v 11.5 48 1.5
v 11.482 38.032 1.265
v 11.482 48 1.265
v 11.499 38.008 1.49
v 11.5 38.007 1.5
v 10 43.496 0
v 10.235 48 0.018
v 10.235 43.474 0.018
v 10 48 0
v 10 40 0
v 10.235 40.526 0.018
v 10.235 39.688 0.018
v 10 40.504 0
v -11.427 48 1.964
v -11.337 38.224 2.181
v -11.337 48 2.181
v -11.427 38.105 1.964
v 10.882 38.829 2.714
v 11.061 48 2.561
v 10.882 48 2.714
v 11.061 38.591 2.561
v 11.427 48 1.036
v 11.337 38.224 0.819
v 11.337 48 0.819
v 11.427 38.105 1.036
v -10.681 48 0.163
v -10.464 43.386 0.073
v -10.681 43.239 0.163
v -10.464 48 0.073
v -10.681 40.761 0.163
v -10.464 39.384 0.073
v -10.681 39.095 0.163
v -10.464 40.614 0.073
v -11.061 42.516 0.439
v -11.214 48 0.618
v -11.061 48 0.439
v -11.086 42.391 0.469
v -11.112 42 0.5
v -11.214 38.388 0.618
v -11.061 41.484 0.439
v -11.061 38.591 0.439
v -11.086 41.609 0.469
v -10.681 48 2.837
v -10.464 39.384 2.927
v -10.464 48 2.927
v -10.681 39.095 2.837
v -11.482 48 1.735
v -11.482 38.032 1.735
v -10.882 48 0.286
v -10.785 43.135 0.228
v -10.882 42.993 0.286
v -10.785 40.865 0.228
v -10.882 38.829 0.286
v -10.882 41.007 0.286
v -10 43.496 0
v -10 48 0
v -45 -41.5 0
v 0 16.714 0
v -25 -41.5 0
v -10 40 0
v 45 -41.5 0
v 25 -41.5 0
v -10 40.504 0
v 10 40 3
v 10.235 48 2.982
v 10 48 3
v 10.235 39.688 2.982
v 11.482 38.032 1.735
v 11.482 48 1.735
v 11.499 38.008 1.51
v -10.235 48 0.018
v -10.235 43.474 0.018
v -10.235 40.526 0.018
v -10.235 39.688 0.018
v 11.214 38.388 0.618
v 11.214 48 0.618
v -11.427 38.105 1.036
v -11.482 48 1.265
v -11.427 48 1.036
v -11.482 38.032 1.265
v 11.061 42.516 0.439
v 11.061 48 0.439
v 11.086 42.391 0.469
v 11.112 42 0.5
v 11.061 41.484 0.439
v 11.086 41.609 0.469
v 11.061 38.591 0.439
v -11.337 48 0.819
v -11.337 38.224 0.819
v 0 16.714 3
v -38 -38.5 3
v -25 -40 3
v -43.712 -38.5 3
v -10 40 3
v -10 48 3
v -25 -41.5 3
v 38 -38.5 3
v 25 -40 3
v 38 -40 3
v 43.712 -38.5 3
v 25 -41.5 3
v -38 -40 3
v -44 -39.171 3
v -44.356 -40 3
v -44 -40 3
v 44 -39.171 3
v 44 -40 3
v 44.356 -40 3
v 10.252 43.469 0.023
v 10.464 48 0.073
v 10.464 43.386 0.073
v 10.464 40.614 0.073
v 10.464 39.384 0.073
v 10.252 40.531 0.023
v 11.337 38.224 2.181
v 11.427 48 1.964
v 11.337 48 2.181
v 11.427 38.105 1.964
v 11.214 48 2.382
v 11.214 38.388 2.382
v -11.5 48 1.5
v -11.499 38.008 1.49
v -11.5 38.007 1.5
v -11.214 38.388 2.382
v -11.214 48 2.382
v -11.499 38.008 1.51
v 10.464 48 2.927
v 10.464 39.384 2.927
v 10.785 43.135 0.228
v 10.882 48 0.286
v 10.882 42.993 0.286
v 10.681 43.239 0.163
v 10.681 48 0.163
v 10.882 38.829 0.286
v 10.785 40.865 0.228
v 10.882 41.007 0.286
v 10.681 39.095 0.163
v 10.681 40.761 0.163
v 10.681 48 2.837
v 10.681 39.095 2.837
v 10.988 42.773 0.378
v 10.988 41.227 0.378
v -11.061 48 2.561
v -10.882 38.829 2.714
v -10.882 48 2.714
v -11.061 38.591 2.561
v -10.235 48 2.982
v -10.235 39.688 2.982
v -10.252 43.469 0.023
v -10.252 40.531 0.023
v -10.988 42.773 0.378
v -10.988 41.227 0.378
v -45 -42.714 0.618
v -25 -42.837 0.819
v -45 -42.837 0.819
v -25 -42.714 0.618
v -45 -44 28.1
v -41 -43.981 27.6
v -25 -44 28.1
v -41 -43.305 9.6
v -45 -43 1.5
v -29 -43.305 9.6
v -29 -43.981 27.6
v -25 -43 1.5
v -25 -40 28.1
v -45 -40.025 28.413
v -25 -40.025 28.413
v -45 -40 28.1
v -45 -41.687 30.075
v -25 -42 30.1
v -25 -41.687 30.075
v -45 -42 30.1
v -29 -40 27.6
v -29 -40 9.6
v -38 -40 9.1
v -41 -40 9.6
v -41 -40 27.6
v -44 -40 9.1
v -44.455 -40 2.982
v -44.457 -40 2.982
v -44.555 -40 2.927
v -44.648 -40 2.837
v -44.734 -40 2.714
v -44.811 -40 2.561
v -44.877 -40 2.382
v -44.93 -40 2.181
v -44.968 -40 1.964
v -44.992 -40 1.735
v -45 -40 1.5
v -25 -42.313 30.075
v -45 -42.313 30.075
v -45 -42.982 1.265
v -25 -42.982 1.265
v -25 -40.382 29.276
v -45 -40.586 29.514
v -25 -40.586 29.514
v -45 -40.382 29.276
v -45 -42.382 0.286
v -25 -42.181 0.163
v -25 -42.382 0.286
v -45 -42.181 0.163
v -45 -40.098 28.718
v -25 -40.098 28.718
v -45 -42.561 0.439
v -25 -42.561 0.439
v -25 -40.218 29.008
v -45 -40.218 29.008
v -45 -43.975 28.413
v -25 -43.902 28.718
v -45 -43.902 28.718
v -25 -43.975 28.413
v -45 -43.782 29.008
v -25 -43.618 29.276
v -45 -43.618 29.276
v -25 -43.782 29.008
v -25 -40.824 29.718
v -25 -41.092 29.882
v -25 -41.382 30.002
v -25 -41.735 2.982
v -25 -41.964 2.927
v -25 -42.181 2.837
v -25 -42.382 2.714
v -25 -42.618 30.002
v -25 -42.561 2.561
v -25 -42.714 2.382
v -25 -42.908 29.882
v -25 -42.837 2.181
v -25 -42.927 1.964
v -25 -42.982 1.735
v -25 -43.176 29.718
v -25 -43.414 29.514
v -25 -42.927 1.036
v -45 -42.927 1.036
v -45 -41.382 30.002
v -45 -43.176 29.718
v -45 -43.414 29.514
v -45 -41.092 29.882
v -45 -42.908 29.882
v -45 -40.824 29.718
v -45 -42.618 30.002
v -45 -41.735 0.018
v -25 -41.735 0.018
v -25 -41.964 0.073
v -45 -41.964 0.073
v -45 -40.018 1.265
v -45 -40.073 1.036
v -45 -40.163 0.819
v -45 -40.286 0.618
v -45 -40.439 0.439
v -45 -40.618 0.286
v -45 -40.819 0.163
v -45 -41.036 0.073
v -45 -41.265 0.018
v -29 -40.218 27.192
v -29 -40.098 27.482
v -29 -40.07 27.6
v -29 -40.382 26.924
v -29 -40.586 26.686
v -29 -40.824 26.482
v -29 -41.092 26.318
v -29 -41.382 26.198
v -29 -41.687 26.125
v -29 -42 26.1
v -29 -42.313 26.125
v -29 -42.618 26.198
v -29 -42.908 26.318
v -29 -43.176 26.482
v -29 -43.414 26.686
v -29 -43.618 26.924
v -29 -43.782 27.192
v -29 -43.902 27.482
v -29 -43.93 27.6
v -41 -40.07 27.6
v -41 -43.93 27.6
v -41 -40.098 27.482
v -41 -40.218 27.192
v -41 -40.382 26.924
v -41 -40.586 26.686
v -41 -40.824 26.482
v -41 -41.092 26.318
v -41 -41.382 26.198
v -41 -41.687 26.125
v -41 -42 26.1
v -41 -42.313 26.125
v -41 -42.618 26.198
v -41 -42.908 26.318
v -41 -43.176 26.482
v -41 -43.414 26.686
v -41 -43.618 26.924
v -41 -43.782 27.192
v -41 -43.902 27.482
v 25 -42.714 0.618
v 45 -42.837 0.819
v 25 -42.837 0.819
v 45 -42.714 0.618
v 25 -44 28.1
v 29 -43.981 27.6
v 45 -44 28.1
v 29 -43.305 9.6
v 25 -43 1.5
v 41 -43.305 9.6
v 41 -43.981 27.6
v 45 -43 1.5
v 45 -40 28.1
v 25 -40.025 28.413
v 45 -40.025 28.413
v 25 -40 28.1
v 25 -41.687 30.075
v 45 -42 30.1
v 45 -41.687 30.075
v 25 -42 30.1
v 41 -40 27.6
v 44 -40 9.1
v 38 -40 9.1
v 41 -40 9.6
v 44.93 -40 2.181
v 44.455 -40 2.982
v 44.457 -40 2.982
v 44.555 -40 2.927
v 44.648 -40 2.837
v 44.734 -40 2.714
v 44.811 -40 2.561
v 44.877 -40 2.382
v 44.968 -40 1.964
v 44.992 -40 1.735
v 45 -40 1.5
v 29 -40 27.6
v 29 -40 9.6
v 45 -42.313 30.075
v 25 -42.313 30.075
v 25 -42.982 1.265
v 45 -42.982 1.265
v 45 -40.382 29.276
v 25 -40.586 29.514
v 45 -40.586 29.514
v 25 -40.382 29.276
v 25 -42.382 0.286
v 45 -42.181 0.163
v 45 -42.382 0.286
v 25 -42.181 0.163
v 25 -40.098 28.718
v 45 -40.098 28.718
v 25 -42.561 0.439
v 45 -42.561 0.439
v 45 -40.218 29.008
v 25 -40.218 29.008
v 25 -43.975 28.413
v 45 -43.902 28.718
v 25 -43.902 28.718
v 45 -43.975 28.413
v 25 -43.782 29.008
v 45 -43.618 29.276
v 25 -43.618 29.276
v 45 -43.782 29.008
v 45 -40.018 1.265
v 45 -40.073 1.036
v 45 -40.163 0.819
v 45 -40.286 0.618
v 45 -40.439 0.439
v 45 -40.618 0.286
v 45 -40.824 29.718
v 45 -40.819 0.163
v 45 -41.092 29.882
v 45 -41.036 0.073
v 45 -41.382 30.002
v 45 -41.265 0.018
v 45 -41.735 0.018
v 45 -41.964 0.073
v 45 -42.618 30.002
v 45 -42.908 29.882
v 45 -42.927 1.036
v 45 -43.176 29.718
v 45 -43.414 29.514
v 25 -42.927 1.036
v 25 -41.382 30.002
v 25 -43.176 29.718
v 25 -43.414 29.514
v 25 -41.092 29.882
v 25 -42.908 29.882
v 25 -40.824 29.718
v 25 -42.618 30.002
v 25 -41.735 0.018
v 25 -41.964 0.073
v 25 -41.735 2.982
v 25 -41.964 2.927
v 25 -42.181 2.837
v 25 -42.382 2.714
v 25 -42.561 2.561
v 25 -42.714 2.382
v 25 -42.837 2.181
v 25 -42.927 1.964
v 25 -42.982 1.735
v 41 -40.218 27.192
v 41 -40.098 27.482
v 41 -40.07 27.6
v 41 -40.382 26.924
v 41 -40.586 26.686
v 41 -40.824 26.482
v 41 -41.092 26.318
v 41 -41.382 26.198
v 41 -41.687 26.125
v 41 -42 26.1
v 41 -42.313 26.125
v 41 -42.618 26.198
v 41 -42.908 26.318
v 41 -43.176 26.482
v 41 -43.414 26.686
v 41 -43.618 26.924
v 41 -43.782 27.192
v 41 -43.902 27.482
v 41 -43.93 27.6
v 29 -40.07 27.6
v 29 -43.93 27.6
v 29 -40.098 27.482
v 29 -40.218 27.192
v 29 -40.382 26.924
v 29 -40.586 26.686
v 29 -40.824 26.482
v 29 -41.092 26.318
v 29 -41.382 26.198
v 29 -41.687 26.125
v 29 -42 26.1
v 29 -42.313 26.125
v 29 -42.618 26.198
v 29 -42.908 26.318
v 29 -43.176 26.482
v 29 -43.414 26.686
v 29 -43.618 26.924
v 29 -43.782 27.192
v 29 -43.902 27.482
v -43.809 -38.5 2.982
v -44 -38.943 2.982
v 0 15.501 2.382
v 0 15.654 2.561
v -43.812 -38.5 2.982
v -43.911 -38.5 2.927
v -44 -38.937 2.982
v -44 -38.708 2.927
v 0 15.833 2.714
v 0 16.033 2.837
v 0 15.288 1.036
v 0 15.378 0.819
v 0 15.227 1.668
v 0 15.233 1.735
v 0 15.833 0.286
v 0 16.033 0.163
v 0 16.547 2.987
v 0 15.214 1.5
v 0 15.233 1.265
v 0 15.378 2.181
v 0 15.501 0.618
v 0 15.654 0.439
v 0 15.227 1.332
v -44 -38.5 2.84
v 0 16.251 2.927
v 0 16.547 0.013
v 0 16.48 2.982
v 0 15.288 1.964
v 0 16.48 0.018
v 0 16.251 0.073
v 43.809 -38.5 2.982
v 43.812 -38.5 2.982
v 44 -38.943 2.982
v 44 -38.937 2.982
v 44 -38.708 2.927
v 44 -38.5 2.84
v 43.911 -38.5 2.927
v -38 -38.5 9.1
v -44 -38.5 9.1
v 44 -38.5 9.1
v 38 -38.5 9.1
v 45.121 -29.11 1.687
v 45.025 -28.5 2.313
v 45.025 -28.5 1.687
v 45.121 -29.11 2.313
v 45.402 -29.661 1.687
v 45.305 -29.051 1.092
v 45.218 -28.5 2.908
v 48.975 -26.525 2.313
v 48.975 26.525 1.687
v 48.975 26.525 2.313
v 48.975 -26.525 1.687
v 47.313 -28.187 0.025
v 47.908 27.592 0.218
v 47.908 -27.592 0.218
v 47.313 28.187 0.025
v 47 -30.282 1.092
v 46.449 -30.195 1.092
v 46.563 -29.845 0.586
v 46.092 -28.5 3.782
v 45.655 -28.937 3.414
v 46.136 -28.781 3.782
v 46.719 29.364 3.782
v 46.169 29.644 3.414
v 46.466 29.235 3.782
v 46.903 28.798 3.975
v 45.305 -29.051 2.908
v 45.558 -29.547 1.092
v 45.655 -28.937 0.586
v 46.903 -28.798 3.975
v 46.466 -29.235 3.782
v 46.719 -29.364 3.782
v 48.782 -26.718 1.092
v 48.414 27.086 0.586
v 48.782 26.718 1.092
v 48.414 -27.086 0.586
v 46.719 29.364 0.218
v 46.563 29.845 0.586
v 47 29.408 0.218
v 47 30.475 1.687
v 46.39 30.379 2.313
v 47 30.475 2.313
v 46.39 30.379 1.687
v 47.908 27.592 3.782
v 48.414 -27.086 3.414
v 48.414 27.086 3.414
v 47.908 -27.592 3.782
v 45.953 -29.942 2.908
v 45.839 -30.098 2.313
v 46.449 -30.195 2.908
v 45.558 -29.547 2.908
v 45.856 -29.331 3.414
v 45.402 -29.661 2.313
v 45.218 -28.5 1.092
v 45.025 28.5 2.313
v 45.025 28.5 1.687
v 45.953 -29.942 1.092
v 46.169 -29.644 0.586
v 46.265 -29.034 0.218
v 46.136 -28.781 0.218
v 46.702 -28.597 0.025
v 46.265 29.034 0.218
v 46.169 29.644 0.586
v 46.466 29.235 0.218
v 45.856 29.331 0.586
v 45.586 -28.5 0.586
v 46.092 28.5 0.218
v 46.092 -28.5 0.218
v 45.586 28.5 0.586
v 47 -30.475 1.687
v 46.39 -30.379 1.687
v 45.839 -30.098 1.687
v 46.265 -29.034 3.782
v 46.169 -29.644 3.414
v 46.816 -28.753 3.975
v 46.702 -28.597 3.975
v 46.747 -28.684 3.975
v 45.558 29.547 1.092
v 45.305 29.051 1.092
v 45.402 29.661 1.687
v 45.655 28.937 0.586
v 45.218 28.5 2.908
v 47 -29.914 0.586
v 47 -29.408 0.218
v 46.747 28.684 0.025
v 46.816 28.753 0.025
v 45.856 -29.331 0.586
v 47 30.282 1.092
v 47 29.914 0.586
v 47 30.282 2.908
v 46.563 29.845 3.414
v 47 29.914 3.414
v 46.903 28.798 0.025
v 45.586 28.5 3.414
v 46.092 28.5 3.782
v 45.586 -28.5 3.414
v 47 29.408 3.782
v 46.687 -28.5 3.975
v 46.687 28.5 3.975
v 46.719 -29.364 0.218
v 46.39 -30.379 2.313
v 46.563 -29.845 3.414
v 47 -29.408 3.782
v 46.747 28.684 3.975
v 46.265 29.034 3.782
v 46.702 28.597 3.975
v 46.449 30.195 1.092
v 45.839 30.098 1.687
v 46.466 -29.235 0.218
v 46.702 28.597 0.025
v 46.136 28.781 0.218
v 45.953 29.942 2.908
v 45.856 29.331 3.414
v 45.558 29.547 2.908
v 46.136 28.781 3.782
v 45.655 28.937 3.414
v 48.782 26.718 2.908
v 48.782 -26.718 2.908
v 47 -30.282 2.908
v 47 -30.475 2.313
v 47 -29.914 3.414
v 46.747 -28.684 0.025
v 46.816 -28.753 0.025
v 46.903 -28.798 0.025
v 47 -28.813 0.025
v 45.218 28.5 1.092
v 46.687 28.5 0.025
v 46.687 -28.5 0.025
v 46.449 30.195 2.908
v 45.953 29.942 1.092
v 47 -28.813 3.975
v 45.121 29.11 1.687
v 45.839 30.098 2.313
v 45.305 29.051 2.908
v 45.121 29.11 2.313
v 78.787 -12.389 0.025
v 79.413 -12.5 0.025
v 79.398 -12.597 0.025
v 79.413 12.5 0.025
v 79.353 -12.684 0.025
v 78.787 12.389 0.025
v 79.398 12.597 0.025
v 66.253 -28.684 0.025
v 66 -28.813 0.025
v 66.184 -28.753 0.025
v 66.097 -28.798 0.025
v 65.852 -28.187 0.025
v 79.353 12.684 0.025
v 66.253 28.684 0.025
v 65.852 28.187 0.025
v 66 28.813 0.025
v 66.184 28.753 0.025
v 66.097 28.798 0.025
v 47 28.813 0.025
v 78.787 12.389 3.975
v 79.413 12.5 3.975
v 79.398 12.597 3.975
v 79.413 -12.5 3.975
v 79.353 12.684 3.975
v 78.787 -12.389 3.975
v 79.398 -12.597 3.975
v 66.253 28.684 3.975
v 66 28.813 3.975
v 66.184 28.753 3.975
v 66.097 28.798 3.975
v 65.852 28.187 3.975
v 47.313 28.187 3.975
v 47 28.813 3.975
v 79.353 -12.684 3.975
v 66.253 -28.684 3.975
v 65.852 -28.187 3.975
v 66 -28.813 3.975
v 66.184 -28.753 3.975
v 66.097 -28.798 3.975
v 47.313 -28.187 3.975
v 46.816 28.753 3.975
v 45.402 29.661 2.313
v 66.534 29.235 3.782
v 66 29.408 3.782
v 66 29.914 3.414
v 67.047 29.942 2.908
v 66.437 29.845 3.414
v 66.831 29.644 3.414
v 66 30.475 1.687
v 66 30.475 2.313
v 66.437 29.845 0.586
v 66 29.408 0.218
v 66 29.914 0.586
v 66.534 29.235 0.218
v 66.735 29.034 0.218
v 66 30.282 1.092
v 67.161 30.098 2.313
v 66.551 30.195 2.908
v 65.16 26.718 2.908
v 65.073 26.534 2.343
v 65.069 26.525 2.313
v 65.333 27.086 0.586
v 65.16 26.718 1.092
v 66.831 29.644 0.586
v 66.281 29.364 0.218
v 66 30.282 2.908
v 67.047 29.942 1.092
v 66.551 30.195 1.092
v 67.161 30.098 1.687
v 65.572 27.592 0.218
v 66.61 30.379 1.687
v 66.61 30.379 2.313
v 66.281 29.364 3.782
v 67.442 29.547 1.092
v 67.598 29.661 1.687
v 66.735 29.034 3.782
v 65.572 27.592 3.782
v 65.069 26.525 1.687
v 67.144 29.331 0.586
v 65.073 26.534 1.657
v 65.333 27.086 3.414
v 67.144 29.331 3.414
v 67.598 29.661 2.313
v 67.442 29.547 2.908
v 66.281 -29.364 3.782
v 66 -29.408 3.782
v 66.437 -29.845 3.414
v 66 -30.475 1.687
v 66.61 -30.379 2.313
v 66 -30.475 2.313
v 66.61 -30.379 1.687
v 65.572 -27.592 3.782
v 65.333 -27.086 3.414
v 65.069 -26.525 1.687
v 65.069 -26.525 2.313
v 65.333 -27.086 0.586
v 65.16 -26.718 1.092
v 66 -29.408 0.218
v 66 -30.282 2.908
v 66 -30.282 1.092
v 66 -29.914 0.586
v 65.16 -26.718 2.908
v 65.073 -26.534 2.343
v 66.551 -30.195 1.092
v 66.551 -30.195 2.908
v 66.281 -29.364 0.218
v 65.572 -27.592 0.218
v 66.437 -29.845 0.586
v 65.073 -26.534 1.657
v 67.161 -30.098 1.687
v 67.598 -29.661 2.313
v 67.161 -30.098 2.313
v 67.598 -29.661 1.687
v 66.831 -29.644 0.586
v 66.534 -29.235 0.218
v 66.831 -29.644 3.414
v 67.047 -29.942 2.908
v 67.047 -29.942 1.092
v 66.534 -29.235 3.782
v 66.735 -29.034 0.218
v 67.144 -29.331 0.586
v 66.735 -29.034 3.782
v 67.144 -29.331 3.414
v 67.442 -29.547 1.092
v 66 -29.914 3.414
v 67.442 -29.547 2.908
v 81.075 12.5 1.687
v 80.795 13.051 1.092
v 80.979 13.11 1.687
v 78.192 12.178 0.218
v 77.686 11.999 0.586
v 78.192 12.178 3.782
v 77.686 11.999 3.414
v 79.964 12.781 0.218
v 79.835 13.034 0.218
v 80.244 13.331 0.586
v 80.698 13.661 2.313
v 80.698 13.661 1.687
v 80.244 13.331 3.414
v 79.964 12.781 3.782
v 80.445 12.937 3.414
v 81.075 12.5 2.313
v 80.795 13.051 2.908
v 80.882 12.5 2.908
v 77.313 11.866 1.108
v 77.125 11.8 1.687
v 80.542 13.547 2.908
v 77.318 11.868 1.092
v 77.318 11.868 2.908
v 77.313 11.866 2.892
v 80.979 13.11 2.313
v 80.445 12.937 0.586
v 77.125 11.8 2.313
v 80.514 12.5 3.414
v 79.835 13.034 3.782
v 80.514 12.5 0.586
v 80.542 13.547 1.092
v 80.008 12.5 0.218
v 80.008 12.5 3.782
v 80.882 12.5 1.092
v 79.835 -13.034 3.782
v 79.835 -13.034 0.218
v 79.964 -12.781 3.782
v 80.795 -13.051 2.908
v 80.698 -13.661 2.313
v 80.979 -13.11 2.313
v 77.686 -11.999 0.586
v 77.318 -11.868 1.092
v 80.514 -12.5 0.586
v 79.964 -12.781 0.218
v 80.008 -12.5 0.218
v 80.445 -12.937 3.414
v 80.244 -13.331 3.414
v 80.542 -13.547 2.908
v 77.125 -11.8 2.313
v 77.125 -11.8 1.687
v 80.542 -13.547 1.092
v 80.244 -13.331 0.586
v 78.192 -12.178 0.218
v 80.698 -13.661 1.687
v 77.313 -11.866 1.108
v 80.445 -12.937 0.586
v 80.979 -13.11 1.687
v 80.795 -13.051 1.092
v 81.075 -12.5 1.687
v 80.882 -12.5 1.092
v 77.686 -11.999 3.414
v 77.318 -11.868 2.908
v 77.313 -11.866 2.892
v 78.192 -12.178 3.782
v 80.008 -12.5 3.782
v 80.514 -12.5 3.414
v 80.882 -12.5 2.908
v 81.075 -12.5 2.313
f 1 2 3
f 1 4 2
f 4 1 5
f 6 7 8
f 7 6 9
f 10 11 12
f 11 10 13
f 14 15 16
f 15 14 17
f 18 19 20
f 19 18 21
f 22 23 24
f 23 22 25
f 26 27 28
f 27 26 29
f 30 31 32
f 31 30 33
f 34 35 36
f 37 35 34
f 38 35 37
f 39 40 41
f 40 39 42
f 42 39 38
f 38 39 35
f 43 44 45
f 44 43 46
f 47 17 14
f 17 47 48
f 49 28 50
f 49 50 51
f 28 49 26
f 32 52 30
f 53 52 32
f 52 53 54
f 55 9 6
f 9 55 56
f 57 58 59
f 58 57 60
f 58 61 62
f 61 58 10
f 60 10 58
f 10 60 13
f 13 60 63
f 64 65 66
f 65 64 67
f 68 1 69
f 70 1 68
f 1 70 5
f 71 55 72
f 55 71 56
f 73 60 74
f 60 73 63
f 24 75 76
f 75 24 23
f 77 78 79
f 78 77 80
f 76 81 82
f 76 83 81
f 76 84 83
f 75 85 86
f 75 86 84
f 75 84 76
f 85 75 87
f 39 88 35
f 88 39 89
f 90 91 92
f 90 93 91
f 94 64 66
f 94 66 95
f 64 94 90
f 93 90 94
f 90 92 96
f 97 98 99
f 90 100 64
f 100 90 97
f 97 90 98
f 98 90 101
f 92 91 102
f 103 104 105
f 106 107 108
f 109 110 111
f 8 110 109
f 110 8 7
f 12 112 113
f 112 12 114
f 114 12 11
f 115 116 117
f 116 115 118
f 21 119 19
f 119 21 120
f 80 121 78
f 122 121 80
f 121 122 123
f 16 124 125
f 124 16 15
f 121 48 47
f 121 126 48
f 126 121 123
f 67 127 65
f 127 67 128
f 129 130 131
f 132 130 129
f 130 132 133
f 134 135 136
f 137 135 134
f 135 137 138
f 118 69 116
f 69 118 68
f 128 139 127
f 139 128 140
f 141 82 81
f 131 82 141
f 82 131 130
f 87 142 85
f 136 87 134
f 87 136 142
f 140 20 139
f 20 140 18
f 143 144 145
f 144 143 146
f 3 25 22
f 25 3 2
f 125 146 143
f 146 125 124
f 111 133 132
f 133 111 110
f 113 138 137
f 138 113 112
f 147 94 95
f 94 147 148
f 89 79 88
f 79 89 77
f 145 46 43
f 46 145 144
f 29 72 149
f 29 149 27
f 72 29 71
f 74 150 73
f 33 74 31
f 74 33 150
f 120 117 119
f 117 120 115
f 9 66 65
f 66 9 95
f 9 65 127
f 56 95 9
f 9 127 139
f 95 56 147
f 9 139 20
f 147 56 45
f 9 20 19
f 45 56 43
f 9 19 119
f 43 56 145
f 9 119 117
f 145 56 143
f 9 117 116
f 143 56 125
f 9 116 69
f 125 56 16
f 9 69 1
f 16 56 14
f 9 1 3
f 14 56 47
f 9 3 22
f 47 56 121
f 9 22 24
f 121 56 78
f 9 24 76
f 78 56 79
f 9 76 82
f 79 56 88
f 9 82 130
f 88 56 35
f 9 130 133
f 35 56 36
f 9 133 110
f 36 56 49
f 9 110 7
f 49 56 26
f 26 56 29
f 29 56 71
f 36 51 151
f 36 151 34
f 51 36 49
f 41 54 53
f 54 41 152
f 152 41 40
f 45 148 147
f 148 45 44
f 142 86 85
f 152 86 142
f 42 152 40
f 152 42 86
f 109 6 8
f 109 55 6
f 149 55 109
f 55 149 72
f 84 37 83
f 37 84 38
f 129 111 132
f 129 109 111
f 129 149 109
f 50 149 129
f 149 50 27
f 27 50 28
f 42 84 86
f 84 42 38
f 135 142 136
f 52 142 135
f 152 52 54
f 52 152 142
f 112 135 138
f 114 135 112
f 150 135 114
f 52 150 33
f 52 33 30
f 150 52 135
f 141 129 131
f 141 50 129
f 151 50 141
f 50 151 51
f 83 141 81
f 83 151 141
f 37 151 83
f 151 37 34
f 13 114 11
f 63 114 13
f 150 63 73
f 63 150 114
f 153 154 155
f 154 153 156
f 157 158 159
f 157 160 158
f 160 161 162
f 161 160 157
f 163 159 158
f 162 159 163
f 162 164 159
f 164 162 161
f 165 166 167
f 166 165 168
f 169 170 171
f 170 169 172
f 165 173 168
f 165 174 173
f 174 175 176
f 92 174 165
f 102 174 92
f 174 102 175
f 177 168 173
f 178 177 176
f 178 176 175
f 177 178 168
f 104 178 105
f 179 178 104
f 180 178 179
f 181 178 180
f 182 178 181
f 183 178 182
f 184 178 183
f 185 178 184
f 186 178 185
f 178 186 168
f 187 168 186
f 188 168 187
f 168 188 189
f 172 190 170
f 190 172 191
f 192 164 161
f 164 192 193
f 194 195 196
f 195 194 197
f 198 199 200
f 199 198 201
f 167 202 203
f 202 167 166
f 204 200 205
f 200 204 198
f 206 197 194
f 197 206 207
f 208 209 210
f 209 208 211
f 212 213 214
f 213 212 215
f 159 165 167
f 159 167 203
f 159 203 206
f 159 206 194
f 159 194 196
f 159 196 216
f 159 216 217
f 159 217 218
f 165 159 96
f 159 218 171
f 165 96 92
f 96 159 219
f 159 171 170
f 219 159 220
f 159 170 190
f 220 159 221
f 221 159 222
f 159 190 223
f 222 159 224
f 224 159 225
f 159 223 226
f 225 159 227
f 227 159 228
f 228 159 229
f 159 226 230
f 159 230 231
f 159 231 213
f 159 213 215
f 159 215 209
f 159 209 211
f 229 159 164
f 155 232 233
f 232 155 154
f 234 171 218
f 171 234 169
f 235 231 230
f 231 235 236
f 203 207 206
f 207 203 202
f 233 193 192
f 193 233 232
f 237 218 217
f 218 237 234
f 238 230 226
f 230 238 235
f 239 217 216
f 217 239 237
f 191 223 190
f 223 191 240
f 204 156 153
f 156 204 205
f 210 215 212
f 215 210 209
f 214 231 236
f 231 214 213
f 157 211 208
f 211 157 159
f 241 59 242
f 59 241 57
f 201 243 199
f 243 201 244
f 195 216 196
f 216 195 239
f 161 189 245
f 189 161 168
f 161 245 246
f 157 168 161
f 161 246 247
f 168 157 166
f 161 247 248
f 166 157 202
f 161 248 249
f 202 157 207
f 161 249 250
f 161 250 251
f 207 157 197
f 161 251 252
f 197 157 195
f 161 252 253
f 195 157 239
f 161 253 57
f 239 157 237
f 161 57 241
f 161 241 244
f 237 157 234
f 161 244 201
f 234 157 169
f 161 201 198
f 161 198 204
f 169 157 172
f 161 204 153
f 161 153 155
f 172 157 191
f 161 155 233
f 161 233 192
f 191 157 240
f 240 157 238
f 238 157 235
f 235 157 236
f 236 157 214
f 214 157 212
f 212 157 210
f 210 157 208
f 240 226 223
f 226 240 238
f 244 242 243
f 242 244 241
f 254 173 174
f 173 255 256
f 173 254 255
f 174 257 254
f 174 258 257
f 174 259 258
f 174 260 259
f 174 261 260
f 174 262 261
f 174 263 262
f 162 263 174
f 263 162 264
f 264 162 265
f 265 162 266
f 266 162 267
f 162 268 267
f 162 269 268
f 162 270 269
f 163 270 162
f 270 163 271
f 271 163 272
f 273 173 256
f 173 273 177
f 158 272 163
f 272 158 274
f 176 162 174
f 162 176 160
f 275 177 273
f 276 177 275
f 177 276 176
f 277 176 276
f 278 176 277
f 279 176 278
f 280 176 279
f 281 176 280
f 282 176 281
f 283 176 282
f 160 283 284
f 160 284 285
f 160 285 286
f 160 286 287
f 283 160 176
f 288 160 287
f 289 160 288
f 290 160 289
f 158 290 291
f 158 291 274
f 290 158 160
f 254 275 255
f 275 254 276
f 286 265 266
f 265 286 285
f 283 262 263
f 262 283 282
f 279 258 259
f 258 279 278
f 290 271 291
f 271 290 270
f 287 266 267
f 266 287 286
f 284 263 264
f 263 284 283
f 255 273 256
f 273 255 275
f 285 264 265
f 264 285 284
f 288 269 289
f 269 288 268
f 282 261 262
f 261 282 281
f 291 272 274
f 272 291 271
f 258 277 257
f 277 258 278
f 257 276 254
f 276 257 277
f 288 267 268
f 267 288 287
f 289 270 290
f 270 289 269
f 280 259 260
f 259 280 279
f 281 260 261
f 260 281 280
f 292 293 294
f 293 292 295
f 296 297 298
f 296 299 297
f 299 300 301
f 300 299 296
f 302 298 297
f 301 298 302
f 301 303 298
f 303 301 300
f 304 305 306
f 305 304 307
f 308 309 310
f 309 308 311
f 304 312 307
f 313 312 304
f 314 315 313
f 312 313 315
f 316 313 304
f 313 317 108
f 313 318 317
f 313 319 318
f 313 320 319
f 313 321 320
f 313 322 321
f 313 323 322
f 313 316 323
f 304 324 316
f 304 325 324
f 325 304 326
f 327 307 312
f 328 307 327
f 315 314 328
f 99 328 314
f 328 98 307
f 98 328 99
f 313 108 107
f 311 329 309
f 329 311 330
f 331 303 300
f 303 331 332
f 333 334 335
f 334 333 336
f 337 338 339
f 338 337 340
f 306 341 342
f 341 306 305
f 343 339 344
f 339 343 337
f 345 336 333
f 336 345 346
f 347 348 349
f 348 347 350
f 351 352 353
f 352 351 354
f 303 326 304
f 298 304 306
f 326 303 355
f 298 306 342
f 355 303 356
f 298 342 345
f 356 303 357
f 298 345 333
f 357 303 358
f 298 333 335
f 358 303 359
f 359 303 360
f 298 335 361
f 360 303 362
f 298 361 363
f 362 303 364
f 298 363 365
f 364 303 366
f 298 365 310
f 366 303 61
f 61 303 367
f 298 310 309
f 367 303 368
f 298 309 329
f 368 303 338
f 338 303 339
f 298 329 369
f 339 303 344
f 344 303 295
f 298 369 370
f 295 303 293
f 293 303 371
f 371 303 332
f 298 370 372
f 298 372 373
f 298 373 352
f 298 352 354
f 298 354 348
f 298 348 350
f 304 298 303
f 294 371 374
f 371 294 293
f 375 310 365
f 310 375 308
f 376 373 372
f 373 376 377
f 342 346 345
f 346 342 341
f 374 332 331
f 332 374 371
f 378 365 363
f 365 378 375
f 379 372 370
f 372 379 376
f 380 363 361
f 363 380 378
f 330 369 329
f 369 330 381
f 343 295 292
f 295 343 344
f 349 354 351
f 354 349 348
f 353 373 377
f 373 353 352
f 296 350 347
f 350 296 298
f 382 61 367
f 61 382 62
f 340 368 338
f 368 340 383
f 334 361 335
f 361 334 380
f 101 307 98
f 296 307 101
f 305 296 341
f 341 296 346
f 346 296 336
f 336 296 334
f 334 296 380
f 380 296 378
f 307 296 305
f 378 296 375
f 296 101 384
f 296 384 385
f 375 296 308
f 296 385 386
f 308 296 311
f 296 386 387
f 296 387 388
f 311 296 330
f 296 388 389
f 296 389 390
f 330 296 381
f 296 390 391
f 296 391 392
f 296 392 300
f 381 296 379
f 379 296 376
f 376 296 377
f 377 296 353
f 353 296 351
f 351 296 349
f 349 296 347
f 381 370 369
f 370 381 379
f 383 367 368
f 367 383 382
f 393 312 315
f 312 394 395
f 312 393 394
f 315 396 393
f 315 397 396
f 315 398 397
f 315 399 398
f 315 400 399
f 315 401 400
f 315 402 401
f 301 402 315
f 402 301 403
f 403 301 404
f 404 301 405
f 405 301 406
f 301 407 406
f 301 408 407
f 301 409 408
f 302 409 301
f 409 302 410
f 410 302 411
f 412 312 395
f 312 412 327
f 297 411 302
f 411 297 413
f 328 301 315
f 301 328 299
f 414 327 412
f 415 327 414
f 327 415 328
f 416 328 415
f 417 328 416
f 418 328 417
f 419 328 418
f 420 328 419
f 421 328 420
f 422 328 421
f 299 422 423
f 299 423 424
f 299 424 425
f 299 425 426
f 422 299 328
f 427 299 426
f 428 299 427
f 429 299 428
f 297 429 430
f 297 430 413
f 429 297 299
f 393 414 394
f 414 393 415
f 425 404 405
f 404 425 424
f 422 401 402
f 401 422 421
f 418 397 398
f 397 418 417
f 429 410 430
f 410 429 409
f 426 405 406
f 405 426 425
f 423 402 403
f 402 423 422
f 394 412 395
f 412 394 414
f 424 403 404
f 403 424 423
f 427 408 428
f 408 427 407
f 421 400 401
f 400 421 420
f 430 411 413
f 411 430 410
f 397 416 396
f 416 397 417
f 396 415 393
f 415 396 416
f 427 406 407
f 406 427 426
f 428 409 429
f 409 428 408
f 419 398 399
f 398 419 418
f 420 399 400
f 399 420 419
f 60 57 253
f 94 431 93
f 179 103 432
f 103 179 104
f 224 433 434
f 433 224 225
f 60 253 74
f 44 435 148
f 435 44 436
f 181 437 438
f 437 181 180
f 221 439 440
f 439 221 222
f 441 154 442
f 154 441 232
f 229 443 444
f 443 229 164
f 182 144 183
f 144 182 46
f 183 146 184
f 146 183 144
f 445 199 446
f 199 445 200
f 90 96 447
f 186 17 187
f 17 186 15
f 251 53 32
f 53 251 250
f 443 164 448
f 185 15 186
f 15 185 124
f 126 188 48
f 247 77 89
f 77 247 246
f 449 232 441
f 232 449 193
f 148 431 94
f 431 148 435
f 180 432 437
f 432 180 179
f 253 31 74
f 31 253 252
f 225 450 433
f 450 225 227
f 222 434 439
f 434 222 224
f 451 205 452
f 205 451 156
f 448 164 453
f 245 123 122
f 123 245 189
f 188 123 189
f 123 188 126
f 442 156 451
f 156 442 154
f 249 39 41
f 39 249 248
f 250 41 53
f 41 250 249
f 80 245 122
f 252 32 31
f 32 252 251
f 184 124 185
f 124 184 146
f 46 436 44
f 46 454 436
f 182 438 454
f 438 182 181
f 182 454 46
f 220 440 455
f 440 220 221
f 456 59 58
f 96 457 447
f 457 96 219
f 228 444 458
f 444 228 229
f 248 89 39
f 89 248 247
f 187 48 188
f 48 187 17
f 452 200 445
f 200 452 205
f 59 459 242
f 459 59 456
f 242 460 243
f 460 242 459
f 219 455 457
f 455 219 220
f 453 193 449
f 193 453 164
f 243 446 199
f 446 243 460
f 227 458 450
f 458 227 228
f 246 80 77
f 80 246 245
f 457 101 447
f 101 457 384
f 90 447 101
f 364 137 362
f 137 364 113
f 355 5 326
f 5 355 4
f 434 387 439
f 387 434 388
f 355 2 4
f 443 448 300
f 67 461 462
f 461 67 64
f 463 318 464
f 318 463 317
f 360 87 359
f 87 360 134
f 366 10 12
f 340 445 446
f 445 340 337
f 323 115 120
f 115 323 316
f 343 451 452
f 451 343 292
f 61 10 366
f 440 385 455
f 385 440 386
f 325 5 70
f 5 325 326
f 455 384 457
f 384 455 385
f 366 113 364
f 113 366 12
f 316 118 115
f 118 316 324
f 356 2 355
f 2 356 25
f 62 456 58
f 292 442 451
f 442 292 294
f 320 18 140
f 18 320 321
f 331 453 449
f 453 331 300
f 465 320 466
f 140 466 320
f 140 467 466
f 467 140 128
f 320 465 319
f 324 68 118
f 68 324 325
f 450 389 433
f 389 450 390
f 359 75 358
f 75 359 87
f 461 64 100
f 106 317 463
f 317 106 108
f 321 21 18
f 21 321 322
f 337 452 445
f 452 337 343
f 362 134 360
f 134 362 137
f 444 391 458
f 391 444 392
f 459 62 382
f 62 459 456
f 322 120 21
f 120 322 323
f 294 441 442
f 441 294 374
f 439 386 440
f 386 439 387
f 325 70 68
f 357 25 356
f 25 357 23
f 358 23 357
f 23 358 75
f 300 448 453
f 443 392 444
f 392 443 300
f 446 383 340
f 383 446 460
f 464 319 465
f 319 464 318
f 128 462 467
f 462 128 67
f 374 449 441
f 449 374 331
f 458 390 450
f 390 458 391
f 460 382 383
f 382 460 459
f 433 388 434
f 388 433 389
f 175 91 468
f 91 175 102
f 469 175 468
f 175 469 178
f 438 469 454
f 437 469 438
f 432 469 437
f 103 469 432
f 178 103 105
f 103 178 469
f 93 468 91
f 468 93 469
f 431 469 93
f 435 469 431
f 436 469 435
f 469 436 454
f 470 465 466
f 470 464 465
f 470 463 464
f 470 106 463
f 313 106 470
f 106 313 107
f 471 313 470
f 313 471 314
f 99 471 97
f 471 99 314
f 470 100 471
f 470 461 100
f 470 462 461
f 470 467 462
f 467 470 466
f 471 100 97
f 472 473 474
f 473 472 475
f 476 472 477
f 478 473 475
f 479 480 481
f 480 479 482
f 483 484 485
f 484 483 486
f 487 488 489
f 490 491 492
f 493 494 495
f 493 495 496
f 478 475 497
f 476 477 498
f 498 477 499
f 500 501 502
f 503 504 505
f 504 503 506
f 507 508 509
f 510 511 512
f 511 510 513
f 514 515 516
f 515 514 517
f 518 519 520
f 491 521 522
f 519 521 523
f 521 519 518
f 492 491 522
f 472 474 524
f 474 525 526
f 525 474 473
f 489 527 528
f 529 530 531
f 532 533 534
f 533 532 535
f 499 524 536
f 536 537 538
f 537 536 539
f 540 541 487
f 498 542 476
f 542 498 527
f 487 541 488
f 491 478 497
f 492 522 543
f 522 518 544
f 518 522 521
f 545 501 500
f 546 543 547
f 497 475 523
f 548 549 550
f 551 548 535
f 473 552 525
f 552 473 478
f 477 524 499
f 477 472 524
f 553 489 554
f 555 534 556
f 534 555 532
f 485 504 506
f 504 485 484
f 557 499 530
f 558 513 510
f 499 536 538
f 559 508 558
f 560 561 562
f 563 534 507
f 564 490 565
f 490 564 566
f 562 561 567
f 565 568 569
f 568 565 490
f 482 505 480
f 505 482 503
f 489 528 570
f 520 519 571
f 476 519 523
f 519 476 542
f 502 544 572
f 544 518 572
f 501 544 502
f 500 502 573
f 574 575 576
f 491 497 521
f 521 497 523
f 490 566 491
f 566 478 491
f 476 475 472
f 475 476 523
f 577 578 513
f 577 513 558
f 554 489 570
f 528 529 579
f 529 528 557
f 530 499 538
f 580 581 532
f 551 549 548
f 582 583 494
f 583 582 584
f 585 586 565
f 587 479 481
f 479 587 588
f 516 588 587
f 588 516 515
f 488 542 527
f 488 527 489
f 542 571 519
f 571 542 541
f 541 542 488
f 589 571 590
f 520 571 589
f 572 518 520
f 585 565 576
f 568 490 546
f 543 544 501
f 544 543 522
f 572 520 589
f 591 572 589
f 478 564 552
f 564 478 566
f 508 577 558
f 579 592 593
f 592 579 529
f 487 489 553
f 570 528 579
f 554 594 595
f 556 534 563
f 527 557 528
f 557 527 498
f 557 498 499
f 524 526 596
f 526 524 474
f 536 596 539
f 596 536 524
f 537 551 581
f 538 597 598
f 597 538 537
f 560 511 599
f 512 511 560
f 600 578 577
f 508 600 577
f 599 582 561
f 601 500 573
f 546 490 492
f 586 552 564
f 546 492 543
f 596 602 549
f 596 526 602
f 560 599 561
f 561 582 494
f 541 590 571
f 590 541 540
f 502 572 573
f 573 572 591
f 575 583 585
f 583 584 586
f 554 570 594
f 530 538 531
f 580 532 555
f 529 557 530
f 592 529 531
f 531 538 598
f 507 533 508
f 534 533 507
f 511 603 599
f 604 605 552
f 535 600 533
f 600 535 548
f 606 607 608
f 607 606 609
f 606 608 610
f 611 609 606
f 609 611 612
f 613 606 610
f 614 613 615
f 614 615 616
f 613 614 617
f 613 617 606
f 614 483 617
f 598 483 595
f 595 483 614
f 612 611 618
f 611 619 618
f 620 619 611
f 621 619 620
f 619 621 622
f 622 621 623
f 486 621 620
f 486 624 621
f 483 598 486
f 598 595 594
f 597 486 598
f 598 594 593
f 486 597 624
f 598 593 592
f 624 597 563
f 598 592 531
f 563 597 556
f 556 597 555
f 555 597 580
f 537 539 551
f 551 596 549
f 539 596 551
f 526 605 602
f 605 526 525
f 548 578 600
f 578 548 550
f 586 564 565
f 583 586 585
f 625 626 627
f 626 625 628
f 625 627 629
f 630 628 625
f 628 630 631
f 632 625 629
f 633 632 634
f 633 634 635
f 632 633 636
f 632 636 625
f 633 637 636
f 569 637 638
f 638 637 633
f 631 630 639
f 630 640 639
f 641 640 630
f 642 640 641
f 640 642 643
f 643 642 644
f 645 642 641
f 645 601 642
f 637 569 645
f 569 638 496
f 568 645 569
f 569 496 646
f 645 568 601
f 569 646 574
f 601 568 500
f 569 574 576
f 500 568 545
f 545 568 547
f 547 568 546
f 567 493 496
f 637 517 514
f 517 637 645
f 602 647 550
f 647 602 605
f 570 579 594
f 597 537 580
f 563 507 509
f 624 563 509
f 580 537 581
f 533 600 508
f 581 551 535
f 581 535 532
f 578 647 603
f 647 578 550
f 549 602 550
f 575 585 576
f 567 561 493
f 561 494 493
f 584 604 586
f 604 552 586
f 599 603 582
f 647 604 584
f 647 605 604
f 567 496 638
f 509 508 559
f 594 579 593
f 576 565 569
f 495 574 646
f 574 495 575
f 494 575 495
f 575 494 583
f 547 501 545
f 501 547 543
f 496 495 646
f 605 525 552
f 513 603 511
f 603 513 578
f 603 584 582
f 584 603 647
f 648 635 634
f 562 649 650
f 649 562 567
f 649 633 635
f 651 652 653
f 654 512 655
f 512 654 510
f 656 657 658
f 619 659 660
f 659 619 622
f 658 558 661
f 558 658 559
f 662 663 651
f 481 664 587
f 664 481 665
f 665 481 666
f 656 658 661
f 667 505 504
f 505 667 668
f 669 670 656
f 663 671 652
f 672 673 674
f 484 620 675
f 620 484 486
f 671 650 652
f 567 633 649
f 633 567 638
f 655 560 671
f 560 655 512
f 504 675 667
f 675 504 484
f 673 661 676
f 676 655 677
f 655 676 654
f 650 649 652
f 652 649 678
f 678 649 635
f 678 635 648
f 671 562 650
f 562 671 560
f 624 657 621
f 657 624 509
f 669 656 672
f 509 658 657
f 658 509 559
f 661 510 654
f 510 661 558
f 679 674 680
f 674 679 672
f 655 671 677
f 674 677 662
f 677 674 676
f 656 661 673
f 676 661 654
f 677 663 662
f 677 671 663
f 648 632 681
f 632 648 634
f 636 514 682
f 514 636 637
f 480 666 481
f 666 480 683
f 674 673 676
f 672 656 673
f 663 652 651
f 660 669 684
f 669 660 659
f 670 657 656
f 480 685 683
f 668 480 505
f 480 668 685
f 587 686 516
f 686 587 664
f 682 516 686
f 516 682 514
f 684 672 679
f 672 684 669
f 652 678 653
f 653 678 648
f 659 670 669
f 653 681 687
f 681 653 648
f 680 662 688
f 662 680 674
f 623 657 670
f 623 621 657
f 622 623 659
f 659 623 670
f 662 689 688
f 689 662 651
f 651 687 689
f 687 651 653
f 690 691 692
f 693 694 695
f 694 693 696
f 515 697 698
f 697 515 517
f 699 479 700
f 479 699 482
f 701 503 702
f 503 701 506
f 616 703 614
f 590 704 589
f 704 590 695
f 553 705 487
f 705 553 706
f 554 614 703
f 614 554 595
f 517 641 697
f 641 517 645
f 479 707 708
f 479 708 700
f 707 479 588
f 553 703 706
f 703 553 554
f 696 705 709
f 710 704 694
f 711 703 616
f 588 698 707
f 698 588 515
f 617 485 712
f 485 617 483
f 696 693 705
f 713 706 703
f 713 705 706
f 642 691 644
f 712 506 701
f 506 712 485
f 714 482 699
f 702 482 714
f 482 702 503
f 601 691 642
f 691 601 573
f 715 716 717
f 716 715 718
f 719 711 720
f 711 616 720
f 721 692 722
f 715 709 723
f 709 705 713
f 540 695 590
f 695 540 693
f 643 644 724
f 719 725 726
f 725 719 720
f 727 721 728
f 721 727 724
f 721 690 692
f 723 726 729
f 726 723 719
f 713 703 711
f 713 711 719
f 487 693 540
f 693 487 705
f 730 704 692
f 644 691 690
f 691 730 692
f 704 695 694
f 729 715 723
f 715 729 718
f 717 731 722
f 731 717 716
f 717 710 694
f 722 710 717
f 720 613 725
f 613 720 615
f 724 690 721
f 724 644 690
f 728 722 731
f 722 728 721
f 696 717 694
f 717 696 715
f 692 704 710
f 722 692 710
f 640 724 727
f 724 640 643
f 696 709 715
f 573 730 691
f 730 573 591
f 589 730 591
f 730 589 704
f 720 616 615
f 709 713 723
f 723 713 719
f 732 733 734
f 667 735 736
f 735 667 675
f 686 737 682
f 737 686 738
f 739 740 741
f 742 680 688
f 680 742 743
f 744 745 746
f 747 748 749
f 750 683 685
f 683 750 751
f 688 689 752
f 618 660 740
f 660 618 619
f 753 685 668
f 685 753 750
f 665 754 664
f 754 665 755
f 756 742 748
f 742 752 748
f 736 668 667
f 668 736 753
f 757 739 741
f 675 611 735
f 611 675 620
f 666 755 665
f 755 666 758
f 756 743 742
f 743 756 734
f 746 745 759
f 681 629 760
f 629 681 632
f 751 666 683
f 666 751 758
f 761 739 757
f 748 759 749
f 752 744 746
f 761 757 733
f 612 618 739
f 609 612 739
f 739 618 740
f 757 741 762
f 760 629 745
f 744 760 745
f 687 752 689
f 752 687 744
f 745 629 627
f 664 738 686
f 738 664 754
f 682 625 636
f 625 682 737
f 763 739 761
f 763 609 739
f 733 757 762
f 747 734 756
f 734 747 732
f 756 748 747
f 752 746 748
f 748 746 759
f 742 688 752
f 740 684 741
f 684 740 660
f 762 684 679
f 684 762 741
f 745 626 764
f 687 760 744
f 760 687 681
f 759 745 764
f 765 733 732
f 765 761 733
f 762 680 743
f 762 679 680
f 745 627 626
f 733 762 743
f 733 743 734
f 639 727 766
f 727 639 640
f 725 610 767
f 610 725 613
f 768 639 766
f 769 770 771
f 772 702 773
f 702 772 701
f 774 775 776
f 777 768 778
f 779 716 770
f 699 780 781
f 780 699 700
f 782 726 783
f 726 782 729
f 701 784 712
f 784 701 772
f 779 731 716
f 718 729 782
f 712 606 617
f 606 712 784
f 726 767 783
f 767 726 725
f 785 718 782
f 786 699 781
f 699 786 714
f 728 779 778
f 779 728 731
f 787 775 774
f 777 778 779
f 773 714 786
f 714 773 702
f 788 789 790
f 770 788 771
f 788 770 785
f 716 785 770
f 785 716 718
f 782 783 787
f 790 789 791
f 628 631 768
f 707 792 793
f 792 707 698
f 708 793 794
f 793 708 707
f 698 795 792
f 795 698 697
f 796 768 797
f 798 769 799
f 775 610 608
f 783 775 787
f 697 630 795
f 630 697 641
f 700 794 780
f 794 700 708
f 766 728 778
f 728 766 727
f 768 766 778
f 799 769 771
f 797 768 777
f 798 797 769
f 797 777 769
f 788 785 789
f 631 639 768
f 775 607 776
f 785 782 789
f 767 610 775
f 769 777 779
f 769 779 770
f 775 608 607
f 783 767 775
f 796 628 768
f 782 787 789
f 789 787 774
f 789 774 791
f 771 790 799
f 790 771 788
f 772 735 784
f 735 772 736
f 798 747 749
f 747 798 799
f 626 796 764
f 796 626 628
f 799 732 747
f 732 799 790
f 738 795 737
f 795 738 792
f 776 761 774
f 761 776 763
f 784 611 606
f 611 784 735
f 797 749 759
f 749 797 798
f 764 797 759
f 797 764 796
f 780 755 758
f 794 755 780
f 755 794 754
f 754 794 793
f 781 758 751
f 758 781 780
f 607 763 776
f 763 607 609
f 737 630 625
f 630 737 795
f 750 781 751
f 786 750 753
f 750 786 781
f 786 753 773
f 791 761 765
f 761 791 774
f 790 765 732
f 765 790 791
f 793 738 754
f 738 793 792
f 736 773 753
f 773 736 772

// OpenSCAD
// A front panel to hinge and mount a OnePlus One phone into the Note4 VR Headset

// Which part to make?
part = "both"; // [first:Panel Only,second:Clip Only,both:Panel and Clip]

// Measured Width of Phone
phoneHeight = 77; // measured width of OnePlus One (sideways)

// Measured Depth of Phone (7.1 for iPhone6+, 9.1 for Oneplus One)
phoneDepth = 7.1; // measured depth of phone

/* [Hidden] */
$fn=40;
panelHeight = 80; // really measured it as 79
panelThickness = 3; // thickness of plastic for the panel
hingeThickness = 4; // thickness of lower hooks
hookSeparation = 70; // distance between the two lower hooks
hookWidth = 12; // width of the bottom hooks. Measured as 10.
hookDepth = 18; // distance from flat face to inner hook
foamFudge = 1; // fudge factor due to adding foam, clip radius being oversized, etc
tabWidth = 20; // width of upper tab
tabHeight = 8; // height to make the upper tab
clipThickness = 4; // how thick to make the clip
clipRadius = clipThickness * .5; // Same as clipThickness to make it round  clipThickness * .6; // radius for clips. They'll be slightly bigger than clipThickness
clipClearance = 55; // inner width for upper clip
clipDepthClearance = 17; // inner depth for upper clip
clipWidth = clipClearance + clipRadius; // adjusted for dimensioning
clipDepth = clipDepthClearance + clipRadius; // inner depth before taper for upper clip



if (part== "first") panel();
else if (part == "second") clip();
else if (part == "both") makeBoth();
else makeBoth();


module makeBoth()
{
	panel();
	
	translate ([(hookSeparation + hookWidth)/2 + hingeThickness + clipRadius, 0, 0]) 
	rotate([0,0,270])
	clip();
}

module panel()
{
	// create the panel itself
	union()
	{
		// first leg
		hull()
		{
			translate ([0,(panelHeight/2), panelThickness/2])
			rotate([0,90,0])
			cylinder(r=panelThickness/2, h=tabWidth, center=true);
			
			translate ([-hookSeparation/2, -(panelHeight/2 + panelThickness/2), panelThickness/2])
			rotate([0,90,0])
			cylinder(r=panelThickness/2, h=hookWidth + 2*hingeThickness, center=true);
		}
		
		// second leg
		hull()
		{
			translate ([0,(panelHeight/2), panelThickness/2])
			rotate([0,90,0])
			cylinder(r=panelThickness/2, h=tabWidth, center=true);
				
			translate ([hookSeparation/2, -(panelHeight/2 + panelThickness/2), panelThickness/2])
			rotate([0,90,0])
			cylinder(r=panelThickness/2, h=hookWidth + 2*hingeThickness, center=true);
		}
			
		// add tab
		difference()
		{
			hull()
			{
				translate ([-tabWidth/2, panelHeight/2 + tabHeight/2 - 1, panelThickness/2])
				rotate ([90,0,0])
				cylinder (r=panelThickness/2, h=tabHeight + 2, center=true);
		
				translate ([tabWidth/2, panelHeight/2 + tabHeight/2 - 1, panelThickness/2])
				rotate ([90,0,0])
				cylinder (r=panelThickness/2, h=tabHeight + 2, center=true);
			}
				
			// remove a notch for better clip grip
			translate ([0,(panelHeight + hingeThickness)/2, -clipRadius])
			rotate ([0,90,0])
			cylinder (r=clipRadius+.5,h=tabWidth * 2,center=true);
		}
			
		// add hooks
		translate ([-hookSeparation/2, -panelHeight/2, 0])
		hook();
		
		translate ([hookSeparation/2, -panelHeight/2, 0])
		hook();
			
		// add nubbins for onePlus self alignment (uncomment and adjust "phoneHeight" to make a mini platform to auto-align your phone)
		translate ([-(hookSeparation/2+hookWidth/2), -(panelHeight - (panelHeight - phoneHeight)/2) / 2, (panelThickness + phoneDepth + foamFudge) / 2])
		cube ([hookWidth/2, (panelHeight - phoneHeight)/2, phoneDepth], center=true);
		
		translate ([hookSeparation/2+hookWidth/2, -(panelHeight - (panelHeight - phoneHeight)/2) / 2, (panelThickness + phoneDepth + foamFudge) / 2])
		cube ([hookWidth/2, (panelHeight - phoneHeight)/2, phoneDepth], center=true);
		

	}
}	

module hook()
{
	// create the hooks
	difference()
	{
		hull()
		{
			translate ([0, -panelThickness/2, panelThickness/2])
			rotate([0,90,0])
			cylinder(r=panelThickness/2, h=hookWidth + 2*hingeThickness, center=true);
			
			translate([0, -hingeThickness/2, hingeThickness/2 + hookDepth + phoneDepth + foamFudge])
			rotate([0,90,0])
			cylinder(r=hingeThickness/2, h=hookWidth + 2*hingeThickness, center=true);

		}
		
		translate ([0, -hingeThickness/2, panelThickness/2 + hookDepth/2 + phoneDepth + foamFudge])
		cube ([hookWidth, 100, hookDepth], center=true);
	}
	
	// draw the cylinder back in
	translate([0, -hingeThickness/2, hingeThickness/2 + hookDepth + phoneDepth + foamFudge])
	rotate([0,90,0])
	cylinder(r=hingeThickness/2, h=hookWidth * 1.5, center=true);		

}

module clip()
{
	translate ([0,0,clipThickness/2])
	intersection()
	{
		union()
		{
			hull()
			{
				corner1();
				corner2();
			}
			hull()
			{
				corner1();
				corner3();
			}
			hull()
			{
				corner2();
				corner4();
			}
			hull()
			{
				corner3();
				corner5();
			}
			hull()
			{
				corner4();
				corner6();
			}
			hull()
			{
				corner5();
				corner6();
			}
		}

		cube([1000,1000,clipThickness],center=true); // narrowing the clip to create flats.
	}
}

module corner1() translate([-clipWidth/2,0,0]) sphere(r=clipRadius, $fn=20);
module corner2() translate([clipWidth/2,0,0]) sphere(r=clipRadius, $fn=20);
module corner3() translate([-clipWidth/2,clipDepth,0]) sphere(r=clipRadius, $fn=20);
module corner4() translate([clipWidth/2,clipDepth,0]) sphere(r=clipRadius, $fn=20);
module corner5() translate([-(tabWidth + clipThickness + 1)/2,clipDepth + phoneDepth + foamFudge + clipRadius + panelThickness,0]) sphere(r=clipRadius, $fn=20);
module corner6() translate([(tabWidth + clipThickness + 1)/2,clipDepth + phoneDepth + foamFudge + clipRadius + panelThickness,0]) sphere(r=clipRadius, $fn=20);
